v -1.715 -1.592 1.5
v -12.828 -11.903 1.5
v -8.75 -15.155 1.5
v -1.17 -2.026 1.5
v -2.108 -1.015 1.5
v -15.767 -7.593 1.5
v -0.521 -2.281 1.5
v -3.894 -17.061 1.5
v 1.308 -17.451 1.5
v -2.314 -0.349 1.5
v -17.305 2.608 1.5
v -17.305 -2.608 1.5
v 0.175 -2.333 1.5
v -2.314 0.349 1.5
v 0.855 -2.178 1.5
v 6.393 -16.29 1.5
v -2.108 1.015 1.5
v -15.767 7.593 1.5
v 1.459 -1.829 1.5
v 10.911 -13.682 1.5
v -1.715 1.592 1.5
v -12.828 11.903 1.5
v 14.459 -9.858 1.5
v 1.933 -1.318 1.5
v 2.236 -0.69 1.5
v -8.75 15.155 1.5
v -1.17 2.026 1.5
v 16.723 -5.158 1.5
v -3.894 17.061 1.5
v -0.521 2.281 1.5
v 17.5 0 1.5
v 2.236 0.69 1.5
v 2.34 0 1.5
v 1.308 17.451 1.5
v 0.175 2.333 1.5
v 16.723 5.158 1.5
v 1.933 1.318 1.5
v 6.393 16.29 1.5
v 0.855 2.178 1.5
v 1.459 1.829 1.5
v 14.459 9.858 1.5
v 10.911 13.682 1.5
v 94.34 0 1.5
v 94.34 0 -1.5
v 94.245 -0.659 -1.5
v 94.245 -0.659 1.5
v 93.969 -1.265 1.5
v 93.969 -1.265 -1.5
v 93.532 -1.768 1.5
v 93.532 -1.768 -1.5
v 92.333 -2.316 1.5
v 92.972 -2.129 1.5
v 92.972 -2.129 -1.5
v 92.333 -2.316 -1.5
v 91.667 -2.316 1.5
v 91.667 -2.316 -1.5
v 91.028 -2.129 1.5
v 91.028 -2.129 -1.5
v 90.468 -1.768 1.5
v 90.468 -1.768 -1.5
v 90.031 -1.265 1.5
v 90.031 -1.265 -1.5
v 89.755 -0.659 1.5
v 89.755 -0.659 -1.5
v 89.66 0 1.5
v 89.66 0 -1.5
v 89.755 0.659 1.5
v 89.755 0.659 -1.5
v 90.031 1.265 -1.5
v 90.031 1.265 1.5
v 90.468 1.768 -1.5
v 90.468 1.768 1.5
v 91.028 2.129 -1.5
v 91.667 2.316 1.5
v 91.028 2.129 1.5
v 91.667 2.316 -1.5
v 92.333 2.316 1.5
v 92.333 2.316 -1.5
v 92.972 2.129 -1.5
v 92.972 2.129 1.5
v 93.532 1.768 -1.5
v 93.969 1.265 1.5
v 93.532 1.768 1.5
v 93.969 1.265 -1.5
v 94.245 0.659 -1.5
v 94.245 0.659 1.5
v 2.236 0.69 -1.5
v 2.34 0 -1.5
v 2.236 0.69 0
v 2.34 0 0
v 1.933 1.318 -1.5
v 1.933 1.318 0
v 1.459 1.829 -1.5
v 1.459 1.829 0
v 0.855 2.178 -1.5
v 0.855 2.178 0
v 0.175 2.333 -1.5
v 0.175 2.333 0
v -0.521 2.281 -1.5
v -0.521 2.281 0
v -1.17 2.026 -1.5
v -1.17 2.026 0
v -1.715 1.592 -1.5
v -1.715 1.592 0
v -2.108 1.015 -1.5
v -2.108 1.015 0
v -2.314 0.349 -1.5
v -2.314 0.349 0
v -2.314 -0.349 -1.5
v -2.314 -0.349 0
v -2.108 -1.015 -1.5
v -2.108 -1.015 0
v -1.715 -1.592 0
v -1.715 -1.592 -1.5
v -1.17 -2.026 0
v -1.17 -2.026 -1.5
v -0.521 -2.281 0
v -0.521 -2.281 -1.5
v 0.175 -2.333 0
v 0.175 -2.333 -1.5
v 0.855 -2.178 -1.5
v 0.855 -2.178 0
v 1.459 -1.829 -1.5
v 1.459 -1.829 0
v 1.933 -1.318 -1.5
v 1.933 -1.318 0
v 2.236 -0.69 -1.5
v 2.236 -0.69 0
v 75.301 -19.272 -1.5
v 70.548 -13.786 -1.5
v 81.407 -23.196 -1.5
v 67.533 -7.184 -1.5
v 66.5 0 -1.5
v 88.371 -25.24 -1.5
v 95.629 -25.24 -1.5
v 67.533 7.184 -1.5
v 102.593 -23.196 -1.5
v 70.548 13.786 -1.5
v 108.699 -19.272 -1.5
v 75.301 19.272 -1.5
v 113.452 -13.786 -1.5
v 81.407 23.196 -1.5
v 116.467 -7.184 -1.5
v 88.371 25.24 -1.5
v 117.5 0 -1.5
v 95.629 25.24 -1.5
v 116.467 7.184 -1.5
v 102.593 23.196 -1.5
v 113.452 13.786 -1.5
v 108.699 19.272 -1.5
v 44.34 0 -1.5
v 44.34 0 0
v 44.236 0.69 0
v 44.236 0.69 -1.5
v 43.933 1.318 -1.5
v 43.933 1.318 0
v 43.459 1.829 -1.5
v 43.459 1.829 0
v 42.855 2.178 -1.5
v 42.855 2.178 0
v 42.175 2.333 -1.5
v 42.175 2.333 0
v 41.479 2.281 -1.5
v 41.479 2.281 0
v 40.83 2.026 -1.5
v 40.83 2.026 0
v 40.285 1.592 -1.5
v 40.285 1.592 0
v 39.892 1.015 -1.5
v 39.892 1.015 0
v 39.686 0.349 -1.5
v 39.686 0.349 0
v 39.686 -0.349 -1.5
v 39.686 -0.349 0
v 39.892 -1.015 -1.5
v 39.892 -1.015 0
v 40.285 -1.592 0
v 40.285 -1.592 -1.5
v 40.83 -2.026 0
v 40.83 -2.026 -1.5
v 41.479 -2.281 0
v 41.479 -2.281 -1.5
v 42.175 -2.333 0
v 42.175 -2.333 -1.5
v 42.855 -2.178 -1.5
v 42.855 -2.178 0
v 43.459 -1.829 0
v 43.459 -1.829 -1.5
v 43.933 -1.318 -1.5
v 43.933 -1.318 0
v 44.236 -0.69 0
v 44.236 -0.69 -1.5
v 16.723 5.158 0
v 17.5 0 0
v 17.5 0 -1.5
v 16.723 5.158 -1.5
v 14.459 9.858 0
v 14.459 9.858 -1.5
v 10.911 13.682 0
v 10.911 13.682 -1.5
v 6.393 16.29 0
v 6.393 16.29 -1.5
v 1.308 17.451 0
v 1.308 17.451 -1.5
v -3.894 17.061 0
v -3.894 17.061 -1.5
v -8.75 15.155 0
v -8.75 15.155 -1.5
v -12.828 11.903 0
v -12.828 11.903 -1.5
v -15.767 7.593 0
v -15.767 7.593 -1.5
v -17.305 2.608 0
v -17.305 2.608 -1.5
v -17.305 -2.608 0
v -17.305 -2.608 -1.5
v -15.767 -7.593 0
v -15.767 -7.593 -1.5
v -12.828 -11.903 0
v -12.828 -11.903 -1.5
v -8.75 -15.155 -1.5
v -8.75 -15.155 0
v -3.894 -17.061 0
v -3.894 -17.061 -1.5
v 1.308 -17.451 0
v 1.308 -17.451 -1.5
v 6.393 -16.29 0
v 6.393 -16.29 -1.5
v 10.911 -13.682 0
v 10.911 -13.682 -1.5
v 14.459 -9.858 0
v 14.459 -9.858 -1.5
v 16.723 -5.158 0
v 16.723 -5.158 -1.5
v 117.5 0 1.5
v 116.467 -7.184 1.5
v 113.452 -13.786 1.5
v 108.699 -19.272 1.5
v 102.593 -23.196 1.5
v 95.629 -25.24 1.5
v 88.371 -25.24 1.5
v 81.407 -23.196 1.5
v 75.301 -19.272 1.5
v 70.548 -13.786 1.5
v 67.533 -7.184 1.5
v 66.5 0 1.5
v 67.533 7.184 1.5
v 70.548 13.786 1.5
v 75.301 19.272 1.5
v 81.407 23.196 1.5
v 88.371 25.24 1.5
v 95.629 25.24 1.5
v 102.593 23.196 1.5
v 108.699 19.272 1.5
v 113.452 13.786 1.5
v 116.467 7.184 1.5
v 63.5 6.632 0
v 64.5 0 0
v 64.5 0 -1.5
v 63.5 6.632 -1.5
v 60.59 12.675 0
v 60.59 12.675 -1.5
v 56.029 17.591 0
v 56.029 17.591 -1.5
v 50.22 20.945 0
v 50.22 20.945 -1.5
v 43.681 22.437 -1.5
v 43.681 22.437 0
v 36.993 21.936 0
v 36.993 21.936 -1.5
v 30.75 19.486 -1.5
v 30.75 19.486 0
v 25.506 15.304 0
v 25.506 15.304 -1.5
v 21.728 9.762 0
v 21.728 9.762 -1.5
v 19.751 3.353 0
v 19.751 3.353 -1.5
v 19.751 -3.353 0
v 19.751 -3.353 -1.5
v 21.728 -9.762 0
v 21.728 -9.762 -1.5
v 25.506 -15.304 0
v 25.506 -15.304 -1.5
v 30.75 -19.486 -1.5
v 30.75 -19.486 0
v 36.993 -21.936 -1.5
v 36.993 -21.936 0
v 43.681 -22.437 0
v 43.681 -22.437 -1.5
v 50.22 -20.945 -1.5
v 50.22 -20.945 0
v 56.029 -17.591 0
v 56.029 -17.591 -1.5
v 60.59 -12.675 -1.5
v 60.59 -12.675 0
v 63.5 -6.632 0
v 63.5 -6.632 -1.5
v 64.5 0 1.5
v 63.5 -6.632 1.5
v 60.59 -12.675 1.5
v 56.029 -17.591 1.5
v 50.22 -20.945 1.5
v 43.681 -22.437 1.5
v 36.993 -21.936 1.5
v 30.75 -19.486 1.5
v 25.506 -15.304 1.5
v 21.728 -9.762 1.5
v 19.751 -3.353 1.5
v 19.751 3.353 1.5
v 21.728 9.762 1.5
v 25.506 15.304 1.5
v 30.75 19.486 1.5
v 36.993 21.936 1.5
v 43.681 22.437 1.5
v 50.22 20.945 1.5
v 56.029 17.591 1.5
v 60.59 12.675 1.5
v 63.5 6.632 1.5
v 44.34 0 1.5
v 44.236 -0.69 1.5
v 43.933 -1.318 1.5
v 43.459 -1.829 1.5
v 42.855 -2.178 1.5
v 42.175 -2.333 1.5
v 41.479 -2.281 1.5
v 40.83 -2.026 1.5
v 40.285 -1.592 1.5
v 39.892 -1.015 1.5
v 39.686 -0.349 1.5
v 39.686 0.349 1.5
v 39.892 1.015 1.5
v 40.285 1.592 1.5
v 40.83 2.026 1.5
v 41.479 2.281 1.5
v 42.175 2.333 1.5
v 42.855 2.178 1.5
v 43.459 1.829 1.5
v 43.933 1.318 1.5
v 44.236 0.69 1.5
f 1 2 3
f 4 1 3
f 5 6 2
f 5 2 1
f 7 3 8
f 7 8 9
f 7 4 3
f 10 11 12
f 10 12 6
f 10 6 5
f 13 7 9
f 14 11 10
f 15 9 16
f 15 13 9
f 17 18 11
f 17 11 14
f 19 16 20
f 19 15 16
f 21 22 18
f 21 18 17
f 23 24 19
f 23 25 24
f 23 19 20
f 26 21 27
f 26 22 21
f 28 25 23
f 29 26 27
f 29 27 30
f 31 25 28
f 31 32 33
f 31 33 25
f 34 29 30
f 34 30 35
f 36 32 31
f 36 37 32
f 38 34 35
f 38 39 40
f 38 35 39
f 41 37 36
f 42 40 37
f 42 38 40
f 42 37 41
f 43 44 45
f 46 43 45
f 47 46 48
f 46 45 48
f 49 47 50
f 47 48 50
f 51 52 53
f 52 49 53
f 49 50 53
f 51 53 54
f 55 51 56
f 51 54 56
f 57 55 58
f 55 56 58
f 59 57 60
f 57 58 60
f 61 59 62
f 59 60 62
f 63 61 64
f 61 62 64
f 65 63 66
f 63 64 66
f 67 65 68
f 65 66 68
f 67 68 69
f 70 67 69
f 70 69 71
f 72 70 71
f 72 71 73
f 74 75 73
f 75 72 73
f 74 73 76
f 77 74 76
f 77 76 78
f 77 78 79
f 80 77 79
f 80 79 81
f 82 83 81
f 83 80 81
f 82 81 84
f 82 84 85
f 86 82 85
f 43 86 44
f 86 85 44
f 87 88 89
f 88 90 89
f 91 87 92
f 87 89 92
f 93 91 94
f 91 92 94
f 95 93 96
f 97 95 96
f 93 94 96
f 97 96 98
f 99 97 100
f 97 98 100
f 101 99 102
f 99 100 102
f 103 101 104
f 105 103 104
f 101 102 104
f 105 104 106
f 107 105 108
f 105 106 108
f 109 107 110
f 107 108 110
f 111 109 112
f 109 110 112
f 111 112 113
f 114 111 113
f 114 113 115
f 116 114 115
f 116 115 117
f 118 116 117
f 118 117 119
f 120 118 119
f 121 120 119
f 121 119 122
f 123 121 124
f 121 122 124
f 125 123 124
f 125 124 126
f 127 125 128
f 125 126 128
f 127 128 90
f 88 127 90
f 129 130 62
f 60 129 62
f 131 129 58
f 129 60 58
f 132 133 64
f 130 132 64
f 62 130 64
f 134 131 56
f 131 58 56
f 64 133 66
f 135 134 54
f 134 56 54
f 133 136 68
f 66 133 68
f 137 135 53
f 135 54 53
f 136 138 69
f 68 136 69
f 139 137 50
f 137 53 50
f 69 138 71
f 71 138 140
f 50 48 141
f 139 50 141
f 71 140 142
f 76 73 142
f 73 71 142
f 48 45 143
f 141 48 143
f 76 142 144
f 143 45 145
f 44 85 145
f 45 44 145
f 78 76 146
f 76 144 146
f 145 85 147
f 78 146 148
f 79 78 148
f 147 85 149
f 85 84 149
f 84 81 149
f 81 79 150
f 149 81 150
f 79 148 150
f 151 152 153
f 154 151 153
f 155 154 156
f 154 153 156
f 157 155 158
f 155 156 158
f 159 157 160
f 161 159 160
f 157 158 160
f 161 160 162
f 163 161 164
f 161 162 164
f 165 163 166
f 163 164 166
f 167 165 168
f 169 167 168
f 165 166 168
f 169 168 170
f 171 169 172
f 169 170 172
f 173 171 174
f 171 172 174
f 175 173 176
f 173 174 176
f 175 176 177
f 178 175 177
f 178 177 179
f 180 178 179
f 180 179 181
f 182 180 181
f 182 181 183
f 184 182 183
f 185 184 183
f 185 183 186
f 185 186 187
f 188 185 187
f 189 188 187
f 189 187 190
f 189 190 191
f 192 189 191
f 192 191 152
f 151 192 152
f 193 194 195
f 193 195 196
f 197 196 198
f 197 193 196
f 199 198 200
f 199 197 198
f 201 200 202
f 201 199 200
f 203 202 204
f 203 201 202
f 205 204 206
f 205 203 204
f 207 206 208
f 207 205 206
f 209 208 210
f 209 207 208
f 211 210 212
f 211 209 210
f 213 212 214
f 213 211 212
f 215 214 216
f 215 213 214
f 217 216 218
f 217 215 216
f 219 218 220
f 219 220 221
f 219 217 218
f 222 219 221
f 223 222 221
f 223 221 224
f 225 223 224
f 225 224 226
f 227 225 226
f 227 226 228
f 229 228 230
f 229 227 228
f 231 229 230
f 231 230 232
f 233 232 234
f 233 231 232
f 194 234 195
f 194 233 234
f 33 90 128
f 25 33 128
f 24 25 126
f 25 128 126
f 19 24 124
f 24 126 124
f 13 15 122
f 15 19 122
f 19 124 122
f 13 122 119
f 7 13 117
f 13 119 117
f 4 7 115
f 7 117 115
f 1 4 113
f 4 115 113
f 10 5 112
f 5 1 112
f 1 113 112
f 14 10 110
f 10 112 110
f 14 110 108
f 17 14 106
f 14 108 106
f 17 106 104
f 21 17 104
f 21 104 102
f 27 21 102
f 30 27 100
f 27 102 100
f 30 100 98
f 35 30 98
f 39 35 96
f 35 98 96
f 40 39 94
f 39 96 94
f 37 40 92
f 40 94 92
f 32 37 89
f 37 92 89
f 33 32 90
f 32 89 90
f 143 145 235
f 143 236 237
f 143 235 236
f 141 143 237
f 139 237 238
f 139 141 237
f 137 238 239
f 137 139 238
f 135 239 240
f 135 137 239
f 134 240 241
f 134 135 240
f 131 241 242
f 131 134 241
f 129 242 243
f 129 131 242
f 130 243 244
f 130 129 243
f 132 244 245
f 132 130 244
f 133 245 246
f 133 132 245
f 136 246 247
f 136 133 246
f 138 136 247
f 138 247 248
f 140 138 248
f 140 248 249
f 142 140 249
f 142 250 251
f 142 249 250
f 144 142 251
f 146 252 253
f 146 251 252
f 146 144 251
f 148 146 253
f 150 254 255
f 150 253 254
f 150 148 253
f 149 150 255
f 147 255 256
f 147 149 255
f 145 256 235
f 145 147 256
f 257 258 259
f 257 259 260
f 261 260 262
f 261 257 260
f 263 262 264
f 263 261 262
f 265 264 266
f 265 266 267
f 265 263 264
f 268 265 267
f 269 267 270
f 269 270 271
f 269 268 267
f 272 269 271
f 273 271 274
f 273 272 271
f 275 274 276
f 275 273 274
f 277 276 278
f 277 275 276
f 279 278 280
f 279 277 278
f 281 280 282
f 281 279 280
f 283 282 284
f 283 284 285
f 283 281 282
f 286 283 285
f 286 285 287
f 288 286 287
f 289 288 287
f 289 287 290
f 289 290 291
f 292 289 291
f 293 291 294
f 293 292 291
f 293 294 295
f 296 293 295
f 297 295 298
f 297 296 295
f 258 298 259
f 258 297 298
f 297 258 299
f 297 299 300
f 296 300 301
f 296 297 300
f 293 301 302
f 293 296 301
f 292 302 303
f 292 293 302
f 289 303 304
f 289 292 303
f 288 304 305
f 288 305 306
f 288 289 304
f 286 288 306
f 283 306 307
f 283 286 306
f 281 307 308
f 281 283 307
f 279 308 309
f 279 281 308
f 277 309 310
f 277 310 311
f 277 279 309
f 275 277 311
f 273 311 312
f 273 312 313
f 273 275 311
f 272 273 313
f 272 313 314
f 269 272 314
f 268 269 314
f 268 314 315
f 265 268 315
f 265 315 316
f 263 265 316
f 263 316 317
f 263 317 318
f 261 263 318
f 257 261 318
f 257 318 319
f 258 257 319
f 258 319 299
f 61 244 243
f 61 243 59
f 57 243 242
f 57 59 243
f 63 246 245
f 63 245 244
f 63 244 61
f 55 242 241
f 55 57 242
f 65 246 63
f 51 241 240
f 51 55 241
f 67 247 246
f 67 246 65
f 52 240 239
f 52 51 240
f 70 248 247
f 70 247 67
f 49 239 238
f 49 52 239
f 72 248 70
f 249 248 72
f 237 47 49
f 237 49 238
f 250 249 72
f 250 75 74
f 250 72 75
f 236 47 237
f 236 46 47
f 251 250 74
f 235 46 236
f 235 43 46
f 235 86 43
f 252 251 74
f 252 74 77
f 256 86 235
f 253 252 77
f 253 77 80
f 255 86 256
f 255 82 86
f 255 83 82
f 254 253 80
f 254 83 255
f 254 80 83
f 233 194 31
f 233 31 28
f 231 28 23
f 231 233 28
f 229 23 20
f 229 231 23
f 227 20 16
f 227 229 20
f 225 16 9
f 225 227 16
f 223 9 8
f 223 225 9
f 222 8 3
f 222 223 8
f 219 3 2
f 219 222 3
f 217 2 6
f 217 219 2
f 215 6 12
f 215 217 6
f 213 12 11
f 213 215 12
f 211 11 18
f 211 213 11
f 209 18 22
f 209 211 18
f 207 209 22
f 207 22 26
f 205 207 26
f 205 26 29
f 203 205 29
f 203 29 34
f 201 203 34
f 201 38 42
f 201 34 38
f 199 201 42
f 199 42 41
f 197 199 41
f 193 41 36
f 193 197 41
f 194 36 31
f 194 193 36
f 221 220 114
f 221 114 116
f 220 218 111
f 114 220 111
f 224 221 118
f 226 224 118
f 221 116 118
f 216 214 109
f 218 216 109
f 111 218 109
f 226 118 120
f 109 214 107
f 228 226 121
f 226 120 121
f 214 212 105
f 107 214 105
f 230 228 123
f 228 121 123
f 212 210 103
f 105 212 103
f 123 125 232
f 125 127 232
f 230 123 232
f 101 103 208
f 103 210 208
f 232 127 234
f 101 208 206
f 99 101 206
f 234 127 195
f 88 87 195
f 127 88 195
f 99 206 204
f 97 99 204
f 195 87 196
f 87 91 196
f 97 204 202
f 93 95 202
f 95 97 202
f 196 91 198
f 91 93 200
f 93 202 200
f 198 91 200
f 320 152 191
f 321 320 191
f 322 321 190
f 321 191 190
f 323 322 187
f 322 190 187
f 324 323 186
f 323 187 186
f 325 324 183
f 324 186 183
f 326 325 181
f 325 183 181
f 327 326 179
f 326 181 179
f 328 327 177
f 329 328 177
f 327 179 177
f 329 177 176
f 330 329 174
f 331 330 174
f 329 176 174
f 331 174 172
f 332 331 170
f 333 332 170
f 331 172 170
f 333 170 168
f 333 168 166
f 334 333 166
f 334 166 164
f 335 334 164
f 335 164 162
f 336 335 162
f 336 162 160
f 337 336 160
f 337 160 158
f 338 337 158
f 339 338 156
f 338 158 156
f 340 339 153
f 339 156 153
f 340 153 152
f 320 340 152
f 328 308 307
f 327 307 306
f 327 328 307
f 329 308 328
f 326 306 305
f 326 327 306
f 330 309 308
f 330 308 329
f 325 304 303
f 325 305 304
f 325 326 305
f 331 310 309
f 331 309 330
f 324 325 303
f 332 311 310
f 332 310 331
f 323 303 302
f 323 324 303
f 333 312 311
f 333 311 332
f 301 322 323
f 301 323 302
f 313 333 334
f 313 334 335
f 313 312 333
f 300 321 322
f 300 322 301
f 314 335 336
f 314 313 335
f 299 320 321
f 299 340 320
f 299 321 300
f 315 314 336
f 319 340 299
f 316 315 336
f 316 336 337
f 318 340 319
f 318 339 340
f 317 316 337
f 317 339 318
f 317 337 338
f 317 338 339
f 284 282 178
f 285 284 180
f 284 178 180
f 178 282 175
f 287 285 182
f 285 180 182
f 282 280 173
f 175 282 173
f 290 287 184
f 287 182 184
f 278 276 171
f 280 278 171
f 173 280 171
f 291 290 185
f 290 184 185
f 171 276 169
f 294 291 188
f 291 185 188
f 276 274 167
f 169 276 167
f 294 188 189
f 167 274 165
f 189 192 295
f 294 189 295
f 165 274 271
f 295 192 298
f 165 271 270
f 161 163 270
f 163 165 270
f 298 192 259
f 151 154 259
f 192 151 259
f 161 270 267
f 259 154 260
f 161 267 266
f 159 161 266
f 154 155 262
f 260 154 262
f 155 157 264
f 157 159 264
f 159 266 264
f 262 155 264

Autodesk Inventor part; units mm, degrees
ref_plane "YZ Plane" through (0, 0, 0) normal (1, 0, 0) x (0, 1, 0)
ref_plane "XZ Plane" through (0, 0, 0) normal (0, 1, 0) x (-1, 0, 0)
ref_plane "XY Plane" through (0, 0, 0) normal (0, 0, 1) x (1, 0, 0)
sketch "草圖1" plane through (0, 0, 0) normal (0, 0, 1) x (1, 0, 0)
  circle A0 centre (0, 0) radius 17.5
  circle A1 centre (42, 0) radius 22.5
  circle A2 centre (92, 0) radius 25.5
  circle A3 centre (0, 0) radius 2.34
  circle A4 centre (42, 0) radius 2.34
  circle A5 centre (92, 0) radius 2.34
  line L0 (0, 0) -> (92, 0)
  dimension "d0" = 35
  dimension "d1" = 45
  dimension "d2" = 51
  dimension "d3" = 4.68
  dimension "d4" = 42
  dimension "d5" = 50
extrude "擠出1" add sketch "草圖1" along normal mid plane 3 contours A0
extrude "擠出2" add sketch "草圖1" along normal mid plane 3 separate body contours A1 L0 A4 | L0 A4 A1
extrude "擠出3" add sketch "草圖1" along normal mid plane 3 separate body contours A2
properties part number "wheels" material "木材 (楓木)"
